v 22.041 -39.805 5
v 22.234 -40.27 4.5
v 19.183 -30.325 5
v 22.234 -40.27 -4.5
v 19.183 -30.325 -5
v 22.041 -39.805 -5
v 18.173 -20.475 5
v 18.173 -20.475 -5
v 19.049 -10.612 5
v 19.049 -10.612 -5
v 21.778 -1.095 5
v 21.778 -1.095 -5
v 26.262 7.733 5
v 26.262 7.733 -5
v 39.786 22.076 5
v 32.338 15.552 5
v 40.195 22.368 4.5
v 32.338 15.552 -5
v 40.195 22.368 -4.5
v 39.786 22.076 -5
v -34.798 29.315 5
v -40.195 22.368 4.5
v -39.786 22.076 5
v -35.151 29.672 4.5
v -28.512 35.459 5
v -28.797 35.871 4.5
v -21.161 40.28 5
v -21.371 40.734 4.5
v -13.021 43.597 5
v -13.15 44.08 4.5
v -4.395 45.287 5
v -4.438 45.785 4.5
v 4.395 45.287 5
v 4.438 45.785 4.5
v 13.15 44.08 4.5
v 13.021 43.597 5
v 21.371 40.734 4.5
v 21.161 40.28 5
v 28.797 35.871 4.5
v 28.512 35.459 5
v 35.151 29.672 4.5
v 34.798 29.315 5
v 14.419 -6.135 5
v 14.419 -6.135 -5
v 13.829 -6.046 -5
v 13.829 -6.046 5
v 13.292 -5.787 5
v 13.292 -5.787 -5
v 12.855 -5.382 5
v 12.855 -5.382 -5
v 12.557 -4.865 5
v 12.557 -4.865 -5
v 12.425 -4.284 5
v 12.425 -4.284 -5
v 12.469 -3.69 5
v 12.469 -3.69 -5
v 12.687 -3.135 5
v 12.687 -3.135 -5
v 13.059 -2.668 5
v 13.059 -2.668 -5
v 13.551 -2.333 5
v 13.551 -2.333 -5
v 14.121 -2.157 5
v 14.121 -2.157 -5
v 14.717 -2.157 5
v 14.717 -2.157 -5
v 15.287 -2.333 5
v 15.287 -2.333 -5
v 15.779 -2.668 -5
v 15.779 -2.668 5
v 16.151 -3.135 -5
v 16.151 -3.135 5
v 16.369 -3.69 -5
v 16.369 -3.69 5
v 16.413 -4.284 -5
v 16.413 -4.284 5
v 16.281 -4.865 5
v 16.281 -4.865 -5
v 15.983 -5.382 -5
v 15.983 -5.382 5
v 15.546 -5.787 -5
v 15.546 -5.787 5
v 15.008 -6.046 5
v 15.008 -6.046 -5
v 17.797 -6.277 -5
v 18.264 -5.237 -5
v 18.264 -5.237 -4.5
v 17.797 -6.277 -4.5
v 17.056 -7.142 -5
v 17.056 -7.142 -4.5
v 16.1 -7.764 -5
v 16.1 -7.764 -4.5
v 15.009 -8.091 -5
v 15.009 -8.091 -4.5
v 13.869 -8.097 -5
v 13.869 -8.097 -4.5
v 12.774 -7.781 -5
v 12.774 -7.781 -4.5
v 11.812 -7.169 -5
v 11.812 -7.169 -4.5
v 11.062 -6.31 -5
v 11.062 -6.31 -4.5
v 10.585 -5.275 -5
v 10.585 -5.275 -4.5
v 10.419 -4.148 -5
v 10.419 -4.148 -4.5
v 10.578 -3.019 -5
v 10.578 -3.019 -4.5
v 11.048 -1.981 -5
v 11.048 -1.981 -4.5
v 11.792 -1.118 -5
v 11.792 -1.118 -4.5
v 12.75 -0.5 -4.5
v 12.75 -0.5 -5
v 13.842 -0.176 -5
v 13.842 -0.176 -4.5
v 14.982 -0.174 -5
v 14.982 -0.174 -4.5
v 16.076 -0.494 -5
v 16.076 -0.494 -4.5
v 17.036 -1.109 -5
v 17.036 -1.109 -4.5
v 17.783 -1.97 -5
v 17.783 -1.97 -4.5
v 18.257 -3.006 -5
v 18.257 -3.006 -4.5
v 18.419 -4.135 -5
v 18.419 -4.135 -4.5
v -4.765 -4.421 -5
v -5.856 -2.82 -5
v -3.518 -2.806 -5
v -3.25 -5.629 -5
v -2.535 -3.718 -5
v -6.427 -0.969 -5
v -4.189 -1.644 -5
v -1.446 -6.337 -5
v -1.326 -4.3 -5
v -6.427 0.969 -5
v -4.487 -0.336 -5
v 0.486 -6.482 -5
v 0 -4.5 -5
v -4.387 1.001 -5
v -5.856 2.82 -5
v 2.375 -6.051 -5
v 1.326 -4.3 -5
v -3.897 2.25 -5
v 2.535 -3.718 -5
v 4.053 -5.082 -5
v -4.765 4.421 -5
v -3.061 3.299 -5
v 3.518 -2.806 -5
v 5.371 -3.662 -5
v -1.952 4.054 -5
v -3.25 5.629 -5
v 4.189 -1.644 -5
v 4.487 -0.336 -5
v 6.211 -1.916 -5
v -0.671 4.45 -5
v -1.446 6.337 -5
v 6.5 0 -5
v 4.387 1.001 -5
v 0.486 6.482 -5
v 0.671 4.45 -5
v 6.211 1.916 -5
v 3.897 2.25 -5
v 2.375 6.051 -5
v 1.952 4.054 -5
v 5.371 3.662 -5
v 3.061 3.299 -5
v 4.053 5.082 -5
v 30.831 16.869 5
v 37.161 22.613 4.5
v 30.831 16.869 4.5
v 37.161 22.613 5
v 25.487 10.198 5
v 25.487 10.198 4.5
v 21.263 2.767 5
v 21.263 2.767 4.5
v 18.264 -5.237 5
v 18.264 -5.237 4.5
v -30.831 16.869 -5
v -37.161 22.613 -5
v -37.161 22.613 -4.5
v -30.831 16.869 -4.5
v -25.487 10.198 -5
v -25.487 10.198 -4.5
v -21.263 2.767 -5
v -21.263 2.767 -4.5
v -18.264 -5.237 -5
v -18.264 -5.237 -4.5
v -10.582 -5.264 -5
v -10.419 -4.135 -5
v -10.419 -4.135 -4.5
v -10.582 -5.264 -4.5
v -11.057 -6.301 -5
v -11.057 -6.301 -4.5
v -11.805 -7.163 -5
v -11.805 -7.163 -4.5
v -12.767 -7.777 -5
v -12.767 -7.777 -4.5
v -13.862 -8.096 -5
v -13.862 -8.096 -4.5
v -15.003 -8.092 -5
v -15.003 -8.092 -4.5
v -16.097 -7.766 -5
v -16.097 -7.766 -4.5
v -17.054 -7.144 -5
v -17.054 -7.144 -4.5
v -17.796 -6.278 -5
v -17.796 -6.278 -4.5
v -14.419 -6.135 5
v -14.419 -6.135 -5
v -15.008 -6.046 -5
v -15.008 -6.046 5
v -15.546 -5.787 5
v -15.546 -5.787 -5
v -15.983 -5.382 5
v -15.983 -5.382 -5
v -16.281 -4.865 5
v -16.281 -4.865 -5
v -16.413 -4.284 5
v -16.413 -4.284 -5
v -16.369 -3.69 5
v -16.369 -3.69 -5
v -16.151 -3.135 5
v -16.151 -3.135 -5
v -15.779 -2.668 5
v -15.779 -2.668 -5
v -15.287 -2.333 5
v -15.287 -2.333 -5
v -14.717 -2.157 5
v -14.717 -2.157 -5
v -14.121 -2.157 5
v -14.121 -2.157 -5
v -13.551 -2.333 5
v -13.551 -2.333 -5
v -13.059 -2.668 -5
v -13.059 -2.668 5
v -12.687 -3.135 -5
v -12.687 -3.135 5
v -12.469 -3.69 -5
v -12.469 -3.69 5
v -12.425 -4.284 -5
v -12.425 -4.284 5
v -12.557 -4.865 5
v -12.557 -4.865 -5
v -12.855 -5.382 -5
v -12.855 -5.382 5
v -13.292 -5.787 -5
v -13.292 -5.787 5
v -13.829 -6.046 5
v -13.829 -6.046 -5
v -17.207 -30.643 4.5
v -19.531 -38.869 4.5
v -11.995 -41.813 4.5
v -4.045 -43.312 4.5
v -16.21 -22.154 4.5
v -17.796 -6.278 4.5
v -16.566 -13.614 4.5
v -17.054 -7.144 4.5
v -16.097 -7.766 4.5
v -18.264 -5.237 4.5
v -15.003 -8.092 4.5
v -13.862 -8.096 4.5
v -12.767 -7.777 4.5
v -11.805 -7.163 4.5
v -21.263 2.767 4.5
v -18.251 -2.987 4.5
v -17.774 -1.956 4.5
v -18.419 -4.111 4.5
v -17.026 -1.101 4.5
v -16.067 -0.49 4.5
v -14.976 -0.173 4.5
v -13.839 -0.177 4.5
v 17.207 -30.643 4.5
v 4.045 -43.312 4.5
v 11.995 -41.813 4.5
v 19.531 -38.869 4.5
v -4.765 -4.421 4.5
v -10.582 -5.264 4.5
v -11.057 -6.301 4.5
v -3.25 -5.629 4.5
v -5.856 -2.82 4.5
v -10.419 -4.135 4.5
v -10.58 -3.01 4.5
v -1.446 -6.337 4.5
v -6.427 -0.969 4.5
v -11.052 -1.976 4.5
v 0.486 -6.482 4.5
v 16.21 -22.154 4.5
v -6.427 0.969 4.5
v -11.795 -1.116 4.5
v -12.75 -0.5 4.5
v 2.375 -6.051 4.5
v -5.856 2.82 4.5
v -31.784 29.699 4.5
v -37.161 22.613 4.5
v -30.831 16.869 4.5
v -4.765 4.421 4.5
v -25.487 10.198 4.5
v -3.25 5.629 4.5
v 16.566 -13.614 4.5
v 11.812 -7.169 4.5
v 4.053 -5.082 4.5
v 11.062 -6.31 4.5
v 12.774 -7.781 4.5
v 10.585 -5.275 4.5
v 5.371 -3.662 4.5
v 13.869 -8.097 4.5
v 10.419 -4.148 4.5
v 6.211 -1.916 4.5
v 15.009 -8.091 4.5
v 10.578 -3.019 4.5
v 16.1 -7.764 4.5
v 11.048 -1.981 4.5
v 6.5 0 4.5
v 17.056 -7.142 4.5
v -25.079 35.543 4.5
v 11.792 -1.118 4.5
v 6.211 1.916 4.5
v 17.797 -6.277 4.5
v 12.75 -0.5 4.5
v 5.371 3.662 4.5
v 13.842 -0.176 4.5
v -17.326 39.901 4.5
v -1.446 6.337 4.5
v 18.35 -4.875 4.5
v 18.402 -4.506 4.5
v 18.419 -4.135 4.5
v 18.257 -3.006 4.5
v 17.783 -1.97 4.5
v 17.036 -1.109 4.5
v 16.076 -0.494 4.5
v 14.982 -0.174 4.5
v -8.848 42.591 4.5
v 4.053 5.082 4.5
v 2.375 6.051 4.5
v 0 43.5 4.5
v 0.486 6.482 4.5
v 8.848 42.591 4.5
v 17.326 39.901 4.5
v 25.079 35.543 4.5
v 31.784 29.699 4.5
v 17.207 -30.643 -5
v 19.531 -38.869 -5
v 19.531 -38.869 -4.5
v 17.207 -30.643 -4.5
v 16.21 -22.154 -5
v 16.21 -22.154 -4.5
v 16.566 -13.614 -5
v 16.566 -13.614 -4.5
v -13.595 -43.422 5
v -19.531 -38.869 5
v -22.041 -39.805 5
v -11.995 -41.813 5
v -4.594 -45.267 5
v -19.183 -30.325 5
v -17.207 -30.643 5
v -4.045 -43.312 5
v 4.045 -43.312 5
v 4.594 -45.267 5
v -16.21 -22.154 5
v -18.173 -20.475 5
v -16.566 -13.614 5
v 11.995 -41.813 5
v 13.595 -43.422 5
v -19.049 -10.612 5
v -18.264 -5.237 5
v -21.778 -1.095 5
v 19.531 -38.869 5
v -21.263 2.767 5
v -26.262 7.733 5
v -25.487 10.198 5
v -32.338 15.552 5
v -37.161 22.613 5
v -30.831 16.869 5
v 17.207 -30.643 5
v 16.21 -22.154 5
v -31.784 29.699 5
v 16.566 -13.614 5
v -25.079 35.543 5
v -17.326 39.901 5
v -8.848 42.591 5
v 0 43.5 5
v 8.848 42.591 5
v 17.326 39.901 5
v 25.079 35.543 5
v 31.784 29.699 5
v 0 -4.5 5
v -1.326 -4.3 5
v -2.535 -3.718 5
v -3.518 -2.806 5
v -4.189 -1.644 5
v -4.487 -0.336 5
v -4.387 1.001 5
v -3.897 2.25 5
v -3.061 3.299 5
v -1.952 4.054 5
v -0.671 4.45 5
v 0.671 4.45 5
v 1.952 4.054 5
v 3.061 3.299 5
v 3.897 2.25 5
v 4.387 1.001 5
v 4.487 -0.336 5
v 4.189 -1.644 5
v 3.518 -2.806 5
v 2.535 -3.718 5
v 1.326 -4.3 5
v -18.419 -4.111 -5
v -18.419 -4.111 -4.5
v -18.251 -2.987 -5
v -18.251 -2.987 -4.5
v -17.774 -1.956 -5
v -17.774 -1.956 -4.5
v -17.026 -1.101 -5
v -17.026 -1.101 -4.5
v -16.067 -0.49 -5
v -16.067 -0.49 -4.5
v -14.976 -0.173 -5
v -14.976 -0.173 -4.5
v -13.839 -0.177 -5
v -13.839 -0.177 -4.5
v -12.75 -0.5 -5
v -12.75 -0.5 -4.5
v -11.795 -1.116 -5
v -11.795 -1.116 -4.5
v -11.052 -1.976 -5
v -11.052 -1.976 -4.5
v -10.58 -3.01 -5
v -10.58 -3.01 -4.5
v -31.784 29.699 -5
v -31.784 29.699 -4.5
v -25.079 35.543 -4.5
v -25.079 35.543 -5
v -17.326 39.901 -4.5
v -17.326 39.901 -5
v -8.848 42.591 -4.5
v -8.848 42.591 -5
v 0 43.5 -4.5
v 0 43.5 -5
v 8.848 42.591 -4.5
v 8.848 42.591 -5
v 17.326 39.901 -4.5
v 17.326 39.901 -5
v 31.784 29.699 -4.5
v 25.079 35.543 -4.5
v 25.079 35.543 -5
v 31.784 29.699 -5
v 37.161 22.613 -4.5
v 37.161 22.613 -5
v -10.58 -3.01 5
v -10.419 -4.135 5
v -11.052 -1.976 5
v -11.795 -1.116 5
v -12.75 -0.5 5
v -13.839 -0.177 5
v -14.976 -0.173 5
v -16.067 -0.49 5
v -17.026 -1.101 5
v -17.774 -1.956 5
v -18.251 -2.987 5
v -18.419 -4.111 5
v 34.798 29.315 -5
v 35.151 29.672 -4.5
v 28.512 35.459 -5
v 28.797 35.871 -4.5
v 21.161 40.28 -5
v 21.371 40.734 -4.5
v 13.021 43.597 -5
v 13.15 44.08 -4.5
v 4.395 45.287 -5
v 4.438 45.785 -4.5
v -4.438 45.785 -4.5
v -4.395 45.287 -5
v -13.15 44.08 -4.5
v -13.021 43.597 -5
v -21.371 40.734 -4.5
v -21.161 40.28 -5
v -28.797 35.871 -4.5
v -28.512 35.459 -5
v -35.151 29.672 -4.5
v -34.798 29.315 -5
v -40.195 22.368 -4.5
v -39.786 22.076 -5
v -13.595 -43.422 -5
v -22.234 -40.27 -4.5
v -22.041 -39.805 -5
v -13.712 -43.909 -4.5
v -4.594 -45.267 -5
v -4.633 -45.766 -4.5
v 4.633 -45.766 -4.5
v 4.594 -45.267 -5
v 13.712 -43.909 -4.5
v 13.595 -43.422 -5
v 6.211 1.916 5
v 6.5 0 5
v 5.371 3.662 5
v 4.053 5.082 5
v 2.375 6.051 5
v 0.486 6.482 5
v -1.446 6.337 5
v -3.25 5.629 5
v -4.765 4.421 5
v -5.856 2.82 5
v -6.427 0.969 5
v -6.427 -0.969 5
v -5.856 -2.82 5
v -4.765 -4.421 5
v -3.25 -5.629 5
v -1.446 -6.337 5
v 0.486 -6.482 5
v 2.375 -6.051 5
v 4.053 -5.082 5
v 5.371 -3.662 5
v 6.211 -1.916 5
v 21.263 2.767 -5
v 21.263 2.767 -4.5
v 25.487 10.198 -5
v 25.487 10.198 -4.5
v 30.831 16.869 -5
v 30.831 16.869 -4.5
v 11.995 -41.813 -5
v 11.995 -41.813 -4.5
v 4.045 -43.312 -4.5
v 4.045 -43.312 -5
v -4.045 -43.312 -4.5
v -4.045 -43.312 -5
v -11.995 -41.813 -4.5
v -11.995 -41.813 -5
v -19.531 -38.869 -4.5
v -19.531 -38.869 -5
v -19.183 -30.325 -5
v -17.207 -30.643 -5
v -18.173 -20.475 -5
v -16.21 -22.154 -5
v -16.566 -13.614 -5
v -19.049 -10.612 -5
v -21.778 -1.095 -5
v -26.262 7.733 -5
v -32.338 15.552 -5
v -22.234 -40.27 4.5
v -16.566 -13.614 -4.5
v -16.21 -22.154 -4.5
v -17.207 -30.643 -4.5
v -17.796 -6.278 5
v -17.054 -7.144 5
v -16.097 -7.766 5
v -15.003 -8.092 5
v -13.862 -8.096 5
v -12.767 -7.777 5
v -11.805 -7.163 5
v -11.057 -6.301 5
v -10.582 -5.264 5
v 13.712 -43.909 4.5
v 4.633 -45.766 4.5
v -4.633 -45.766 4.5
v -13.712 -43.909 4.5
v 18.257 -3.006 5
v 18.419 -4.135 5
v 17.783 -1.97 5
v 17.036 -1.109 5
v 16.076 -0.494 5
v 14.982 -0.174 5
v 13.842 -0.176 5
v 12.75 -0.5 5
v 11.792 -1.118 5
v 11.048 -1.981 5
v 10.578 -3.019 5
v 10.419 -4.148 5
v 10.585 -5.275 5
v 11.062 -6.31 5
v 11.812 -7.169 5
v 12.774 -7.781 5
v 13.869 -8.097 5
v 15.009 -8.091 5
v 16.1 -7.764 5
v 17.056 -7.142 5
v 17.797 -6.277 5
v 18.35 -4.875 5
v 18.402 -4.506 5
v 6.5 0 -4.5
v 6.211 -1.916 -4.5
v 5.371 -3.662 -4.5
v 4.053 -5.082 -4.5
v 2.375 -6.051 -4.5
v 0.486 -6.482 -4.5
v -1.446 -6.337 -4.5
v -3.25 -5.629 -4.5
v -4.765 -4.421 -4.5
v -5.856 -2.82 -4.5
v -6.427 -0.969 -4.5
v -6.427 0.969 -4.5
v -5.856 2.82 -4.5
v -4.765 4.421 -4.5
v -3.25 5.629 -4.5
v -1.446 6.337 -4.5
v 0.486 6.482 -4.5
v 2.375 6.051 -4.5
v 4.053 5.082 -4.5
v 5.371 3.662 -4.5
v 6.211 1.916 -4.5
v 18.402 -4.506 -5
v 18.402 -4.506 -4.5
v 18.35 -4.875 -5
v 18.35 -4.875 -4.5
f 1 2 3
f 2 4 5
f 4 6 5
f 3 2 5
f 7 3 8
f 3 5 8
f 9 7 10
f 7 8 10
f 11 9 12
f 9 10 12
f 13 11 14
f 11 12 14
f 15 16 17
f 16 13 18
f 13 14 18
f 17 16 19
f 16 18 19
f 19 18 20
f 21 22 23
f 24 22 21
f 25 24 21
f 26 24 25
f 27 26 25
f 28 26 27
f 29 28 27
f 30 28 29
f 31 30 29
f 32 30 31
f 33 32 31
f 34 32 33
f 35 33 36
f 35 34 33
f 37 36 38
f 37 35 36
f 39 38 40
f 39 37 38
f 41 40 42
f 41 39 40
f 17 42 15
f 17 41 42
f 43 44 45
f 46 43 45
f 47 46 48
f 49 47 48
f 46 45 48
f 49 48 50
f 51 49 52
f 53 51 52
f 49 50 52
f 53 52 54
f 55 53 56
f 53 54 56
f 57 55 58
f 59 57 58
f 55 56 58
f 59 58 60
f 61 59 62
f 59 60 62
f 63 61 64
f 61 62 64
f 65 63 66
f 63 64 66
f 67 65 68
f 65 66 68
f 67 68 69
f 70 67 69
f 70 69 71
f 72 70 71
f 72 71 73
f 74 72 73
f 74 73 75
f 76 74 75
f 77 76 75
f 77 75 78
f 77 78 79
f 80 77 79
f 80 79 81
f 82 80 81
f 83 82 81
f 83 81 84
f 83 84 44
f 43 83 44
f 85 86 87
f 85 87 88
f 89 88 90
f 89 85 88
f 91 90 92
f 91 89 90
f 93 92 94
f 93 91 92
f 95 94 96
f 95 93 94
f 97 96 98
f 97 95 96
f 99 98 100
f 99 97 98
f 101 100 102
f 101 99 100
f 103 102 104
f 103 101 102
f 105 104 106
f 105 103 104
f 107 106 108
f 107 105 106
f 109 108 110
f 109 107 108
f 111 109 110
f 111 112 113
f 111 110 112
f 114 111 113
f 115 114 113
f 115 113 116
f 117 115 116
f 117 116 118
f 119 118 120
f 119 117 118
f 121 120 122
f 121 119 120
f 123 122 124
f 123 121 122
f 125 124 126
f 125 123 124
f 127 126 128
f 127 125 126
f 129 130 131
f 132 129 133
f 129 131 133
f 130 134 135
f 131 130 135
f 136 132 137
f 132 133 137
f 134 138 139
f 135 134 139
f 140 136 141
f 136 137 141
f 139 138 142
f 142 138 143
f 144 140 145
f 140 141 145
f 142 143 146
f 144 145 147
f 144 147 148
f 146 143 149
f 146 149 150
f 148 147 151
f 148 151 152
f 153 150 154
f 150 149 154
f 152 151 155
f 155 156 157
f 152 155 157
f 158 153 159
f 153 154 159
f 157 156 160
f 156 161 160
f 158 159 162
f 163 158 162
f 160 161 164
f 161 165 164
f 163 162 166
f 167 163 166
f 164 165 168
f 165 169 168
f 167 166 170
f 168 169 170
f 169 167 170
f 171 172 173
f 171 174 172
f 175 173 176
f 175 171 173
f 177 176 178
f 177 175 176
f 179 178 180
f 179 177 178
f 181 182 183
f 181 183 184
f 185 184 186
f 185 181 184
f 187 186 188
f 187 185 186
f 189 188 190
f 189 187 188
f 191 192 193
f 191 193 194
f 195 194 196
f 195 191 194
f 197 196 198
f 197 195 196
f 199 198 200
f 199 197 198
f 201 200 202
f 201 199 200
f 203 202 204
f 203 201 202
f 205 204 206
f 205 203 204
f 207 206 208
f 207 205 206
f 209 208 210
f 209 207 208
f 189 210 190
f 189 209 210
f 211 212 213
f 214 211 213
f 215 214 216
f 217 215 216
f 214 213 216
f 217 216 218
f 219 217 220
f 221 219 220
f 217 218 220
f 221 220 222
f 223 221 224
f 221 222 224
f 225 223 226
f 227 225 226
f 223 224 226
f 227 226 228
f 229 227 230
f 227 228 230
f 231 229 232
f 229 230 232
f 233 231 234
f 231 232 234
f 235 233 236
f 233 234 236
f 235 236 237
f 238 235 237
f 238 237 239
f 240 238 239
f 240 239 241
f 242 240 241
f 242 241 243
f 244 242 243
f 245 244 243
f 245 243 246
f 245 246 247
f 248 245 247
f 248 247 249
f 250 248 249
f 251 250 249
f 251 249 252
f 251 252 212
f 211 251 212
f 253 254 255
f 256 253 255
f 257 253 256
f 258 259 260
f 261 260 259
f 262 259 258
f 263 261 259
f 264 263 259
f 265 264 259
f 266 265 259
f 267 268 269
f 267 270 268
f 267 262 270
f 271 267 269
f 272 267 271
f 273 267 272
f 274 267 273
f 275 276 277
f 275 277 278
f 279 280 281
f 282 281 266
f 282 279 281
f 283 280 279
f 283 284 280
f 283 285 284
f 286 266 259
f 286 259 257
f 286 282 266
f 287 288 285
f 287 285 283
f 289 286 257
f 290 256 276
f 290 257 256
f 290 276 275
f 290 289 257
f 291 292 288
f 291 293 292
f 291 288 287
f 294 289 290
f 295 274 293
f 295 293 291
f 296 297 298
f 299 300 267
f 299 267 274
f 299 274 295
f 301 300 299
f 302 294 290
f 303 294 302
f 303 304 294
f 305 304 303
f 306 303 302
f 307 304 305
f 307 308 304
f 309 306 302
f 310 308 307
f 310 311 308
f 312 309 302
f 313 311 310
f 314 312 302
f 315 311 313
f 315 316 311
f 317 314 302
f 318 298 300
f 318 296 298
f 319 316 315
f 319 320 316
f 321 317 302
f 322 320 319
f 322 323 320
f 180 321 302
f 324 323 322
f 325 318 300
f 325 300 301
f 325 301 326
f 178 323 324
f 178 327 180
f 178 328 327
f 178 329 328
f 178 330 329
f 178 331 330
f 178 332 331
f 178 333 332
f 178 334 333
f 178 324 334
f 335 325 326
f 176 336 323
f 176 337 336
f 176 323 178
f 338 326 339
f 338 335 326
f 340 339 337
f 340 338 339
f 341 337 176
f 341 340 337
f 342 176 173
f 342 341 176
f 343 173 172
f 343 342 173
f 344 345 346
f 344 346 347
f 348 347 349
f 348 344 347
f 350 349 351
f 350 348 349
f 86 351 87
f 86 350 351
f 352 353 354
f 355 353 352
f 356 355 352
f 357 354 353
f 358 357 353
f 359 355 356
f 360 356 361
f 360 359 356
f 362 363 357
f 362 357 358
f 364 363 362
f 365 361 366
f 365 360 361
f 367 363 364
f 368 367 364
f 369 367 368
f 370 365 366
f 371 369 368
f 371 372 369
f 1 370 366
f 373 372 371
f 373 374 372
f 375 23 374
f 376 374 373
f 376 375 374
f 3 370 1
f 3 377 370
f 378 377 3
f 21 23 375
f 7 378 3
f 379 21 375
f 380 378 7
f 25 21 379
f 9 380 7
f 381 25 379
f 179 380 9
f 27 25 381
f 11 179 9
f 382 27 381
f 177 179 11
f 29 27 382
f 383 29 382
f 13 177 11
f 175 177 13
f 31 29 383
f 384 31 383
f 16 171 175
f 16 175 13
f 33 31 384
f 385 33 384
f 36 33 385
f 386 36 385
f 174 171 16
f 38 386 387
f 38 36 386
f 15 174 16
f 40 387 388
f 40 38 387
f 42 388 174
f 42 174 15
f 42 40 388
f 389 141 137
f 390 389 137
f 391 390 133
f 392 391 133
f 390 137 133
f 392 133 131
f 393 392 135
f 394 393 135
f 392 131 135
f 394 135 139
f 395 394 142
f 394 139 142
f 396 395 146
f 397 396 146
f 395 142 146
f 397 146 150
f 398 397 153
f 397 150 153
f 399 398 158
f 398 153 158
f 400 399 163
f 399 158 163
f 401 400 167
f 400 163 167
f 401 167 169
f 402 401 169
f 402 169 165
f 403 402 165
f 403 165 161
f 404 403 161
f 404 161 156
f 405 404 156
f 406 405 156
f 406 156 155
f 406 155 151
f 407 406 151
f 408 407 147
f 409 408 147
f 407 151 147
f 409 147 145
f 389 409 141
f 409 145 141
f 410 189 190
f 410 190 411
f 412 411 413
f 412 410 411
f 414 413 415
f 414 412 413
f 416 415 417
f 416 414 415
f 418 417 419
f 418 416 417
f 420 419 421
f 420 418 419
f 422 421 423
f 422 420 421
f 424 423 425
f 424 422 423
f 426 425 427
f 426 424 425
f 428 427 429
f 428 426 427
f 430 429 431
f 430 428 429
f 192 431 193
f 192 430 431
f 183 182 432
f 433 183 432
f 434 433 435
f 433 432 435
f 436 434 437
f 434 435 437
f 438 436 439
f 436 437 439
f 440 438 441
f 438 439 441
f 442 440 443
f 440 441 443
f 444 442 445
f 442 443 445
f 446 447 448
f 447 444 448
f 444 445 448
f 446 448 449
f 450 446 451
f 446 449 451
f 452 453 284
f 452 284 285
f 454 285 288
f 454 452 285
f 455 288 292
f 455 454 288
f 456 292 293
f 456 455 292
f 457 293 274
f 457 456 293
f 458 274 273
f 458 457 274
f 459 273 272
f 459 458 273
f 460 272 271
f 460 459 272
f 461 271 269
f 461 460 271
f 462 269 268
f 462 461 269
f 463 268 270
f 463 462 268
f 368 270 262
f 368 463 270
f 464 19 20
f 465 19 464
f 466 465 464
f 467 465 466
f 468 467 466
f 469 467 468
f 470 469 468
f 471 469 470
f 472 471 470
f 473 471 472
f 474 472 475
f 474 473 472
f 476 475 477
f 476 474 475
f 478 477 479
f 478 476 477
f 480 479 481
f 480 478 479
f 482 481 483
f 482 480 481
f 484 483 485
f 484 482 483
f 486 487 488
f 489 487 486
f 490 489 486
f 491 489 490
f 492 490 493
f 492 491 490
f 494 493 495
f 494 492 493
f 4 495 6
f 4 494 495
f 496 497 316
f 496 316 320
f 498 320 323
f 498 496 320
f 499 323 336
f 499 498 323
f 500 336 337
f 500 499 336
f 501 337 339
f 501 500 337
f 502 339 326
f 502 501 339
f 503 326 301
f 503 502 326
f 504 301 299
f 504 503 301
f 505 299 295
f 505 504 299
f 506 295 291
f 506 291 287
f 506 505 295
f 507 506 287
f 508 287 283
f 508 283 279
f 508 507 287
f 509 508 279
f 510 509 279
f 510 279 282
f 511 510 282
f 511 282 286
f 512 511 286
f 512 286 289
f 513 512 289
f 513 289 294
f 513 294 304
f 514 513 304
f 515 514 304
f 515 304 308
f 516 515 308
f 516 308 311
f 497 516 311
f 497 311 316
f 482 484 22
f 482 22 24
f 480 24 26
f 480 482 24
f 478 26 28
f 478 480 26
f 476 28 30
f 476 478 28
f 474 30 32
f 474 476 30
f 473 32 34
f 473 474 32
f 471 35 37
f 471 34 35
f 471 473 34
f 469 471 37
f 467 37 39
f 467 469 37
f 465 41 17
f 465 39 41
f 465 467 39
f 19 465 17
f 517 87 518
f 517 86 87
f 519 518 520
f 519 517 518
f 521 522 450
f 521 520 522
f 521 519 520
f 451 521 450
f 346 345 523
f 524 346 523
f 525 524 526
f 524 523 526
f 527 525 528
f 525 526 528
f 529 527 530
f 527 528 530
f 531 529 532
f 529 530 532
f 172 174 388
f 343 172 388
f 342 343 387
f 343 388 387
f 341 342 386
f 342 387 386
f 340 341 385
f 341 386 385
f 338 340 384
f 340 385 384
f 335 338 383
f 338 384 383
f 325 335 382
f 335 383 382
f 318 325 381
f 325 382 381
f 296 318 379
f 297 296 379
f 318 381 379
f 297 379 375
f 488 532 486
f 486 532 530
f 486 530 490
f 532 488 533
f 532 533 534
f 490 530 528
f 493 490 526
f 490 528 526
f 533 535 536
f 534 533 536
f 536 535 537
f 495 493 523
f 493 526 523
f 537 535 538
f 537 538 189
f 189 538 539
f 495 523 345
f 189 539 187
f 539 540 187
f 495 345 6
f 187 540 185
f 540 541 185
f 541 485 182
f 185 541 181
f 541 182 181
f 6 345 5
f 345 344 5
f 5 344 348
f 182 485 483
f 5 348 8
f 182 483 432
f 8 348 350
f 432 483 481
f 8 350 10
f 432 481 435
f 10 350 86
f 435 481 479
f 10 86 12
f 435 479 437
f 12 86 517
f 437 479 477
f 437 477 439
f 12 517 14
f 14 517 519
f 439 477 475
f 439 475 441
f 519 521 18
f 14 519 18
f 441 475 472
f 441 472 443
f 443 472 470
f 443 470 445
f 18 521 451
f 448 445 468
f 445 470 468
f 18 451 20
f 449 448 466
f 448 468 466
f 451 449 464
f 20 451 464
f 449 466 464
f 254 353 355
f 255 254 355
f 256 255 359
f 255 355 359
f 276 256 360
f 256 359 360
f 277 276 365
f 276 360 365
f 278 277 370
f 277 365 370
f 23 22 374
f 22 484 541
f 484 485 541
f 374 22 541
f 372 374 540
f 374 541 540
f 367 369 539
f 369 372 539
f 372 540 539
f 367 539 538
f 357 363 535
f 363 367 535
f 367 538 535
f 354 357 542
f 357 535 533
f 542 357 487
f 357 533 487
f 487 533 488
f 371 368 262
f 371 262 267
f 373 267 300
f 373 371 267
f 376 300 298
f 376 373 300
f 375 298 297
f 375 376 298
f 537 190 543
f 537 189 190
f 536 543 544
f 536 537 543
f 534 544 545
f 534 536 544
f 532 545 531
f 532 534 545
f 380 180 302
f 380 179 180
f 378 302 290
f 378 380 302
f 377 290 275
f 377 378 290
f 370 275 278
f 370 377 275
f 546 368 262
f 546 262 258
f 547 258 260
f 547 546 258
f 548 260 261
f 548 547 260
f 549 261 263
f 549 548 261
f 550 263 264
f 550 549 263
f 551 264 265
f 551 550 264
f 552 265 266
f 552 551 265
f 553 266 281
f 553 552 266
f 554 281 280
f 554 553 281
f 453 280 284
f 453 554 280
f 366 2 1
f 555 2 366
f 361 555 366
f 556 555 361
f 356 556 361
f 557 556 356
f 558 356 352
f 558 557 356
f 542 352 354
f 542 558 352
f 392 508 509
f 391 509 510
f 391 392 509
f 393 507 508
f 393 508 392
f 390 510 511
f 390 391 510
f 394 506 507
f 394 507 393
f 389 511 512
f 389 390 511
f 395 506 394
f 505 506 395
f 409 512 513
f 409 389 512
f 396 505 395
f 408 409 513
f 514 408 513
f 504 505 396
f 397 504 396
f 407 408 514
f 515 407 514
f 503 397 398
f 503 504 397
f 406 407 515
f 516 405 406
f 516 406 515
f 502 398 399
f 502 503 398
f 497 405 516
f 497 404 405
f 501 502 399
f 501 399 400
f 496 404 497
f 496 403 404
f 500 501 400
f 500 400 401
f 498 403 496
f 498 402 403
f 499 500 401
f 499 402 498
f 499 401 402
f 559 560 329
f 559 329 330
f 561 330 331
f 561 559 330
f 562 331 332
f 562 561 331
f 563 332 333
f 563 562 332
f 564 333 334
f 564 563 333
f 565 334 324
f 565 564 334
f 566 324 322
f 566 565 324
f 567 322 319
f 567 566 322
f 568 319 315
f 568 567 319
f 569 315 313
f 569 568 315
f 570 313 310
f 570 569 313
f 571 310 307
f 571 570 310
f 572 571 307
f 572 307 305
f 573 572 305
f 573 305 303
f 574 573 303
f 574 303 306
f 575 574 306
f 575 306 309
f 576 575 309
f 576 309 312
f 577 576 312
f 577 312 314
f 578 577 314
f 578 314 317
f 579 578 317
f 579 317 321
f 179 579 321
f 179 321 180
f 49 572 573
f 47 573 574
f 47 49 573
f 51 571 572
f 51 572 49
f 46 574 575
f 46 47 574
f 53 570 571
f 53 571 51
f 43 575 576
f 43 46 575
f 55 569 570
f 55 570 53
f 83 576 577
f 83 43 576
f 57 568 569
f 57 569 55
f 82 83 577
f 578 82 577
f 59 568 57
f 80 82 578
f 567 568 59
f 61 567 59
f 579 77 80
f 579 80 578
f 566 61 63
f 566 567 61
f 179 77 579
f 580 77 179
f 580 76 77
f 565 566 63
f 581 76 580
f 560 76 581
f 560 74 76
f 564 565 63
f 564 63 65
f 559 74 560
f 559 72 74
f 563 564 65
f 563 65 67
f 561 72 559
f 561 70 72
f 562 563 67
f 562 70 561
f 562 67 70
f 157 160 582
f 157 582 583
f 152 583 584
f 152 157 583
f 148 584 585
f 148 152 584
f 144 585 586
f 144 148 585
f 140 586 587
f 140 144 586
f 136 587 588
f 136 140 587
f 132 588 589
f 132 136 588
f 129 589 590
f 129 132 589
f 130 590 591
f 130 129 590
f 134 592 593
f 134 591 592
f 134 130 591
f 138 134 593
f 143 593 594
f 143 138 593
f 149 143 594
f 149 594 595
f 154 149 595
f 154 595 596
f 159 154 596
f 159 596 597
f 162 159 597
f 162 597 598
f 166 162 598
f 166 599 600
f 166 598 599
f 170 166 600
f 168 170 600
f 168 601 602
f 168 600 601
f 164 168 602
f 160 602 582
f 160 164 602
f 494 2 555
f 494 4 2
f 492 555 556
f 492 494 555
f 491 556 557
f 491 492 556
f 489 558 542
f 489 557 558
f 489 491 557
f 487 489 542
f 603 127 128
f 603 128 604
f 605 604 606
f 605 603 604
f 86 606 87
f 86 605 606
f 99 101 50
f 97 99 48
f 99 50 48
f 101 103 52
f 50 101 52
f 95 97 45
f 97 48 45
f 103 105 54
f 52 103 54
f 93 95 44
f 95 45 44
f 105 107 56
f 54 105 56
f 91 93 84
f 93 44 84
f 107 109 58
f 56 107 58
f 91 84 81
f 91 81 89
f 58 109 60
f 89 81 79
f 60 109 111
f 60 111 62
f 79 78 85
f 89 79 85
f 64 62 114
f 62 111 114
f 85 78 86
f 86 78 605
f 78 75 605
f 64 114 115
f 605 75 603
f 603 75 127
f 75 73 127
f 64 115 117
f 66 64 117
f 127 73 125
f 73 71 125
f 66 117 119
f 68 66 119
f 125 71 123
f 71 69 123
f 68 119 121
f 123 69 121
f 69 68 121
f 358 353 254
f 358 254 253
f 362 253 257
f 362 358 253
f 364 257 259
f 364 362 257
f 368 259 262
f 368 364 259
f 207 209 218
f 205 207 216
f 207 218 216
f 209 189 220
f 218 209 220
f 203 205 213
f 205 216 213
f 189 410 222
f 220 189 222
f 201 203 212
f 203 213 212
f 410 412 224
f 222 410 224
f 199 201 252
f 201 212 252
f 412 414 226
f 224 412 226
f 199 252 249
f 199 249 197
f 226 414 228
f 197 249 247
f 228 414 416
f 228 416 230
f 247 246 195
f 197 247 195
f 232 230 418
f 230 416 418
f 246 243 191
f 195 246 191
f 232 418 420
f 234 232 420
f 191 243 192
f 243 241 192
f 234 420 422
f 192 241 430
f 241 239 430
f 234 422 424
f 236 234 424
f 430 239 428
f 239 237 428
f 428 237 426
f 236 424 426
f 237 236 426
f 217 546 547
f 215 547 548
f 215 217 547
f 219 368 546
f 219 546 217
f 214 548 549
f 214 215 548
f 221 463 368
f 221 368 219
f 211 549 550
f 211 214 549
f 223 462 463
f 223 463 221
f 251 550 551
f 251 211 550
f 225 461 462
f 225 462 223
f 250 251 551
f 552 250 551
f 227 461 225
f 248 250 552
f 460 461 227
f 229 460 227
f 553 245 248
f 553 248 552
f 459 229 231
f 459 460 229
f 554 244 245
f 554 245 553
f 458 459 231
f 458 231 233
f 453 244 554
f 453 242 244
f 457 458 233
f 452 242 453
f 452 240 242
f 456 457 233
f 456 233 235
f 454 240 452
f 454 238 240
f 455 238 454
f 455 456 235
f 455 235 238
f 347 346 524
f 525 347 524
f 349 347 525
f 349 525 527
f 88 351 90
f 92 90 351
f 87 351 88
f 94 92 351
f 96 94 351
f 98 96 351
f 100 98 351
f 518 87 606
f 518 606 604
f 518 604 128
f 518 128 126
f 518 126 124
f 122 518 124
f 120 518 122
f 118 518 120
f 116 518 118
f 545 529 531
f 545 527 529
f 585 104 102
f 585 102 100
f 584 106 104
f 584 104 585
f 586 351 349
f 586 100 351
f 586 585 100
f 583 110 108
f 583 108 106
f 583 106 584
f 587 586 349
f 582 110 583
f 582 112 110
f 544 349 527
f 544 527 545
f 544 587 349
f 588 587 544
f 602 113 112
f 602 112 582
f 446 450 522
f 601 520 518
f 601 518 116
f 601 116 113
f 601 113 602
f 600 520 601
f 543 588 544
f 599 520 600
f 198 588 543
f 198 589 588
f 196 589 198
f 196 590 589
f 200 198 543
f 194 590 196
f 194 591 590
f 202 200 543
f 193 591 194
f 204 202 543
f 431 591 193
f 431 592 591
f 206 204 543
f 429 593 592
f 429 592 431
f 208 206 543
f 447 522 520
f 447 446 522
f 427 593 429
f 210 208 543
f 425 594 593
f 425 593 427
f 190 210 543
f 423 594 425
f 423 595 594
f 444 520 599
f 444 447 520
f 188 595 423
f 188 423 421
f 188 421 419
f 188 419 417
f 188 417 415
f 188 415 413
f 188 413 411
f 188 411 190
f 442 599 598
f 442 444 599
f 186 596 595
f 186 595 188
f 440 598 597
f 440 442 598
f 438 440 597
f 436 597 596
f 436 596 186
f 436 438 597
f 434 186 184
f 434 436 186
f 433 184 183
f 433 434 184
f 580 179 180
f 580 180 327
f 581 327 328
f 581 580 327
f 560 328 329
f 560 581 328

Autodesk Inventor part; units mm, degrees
ref_plane "YZ Plane" through (0, 0, 0) normal (1, 0, 0) x (0, 1, 0)
ref_plane "XZ Plane" through (0, 0, 0) normal (0, 1, 0) x (-1, 0, 0)
ref_plane "XY Plane" through (0, 0, 0) normal (0, 0, 1) x (1, 0, 0)
sketch "Sketch1" plane through (0, 0, 0) normal (0, 0, 1) x (1, 0, 0)
  arc A0 (-44.218038, -12.679318) -> (-22.234092, -40.269655) centre (0, 0) ccw construction
  arc A1 (-22.234092, -40.269655) -> (-40.195246, 22.368331) centre (-70.172104, -20.121527) ccw
  line L0 (0, 0) -> (-70.172104, -20.121527) construction
  line L1 (0, -64.4) -> (0, 64.4) construction
  arc A2 (40.195246, 22.368331) -> (22.234092, -40.269655) centre (70.172104, -20.121527) ccw
  line L2 (0, 0) -> (70.172104, -20.121527) construction
  arc A3 (-40.195246, 22.368331) -> (-44.218038, 12.679318) centre (0, 0) ccw construction
  arc A4 (-22.234092, -40.269655) -> (22.234092, -40.269655) centre (0, 0) ccw
  arc A5 (22.234092, -40.269655) -> (40.195246, 22.368331) centre (0, 0) ccw construction
  arc A6 (40.195246, 22.368331) -> (-40.195246, 22.368331) centre (0, 0) ccw
  arc A7 (-44.218038, 12.679318) -> (-44.218038, -12.679318) centre (0, 0) ccw construction
  dimension "d0" = 92
  dimension "d1" = 52
  dimension "d2" = 73
  dimension "d3" = 148
extrude "Extrusion1" add sketch "Sketch1" along normal mid plane 10
sketch "Sketch2" plane through (0, 0, 5) normal (0, 0, 1) x (1, 0, 0)
  arc A0 (-22.234092, -40.269655) -> (-40.195246, 22.368331) centre (-70.172104, -20.121527) ccw
  arc A1 (-22.234092, -40.269655) -> (22.234092, -40.269655) centre (0, 0) ccw
  arc A2 (40.195246, 22.368331) -> (22.234092, -40.269655) centre (70.172104, -20.121527) ccw
  arc A3 (40.195246, 22.368331) -> (-40.195246, 22.368331) centre (0, 0) ccw
  line L0 (0, 0) -> (-70.172104, -20.121527) construction
  line L1 (0, 0) -> (70.172104, -20.121527) construction
  point P0 (-14.418925, -4.13456)
  point P1 (14.418925, -4.13456)
  dimension "d6" = 15
  dimension "d7" = 15
hole "Hole1" at (-14.418925, -4.13456, 5) at (14.418925, -4.13456, 5) direction (0, 0, -1) diameter 4 end through all
sketch "Sketch3" plane through (0, 0, 5) normal (0, 0, 1) x (1, 0, 0)
  arc A0 (-22.234092, -40.269655) -> (22.234092, -40.269655) centre (0, 0) ccw
hole "Hole2" at (0, 0, 5) direction (0, 0, -1) diameter 9 end through all
chamfer "Chamfer1" distance 0.5 angle 45 4 edges at (0, 46, 5) (0, 46, -5) (0, -46, -5) (0, -46, 5)
sketch "Sketch4" plane through (0, 0, 5) normal (0, 0, 1) x (1, 0, 0)
  arc A0 (-22.041384, -39.804866) -> (22.041384, -39.804866) centre (0, 0) ccw
  arc A1 (39.785519, 22.076287) -> (22.041384, -39.804866) centre (70.172104, -20.121527) ccw
  arc A2 (39.785519, 22.076287) -> (-39.785519, 22.076287) centre (0, 0) ccw
  arc A3 (-22.041384, -39.804866) -> (-39.785519, 22.076287) centre (-70.172104, -20.121527) ccw
  circle A4 centre (0, 0) radius 4.5
  circle A5 centre (-14.418925, -4.13456) radius 2
  circle A6 centre (14.418925, -4.13456) radius 2
  arc A7 (37.160523, 22.61295) -> (-37.160523, 22.61295) centre (0, 0) ccw
  arc A8 (37.160523, 22.61295) -> (19.530873, -38.868946) centre (70.172104, -20.121527) ccw
  arc A9 (-19.530873, -38.868946) -> (19.530873, -38.868946) centre (0, 0) ccw
  arc A10 (-19.530873, -38.868946) -> (-37.160523, 22.61295) centre (-70.172104, -20.121527) ccw
  circle A11 centre (-14.418925, -4.13456) radius 4
  circle A12 centre (0, 0) radius 6.5
  circle A13 centre (14.418925, -4.13456) radius 4
  dimension "d25" = 2
  dimension "d26" = 2
  dimension "d27" = 2
  dimension "d28" = 2
extrude "Extrusion2" cut sketch "Sketch4" against normal blind 0.5 contours A8 A9 A10 A7
mirror "Mirror1" about plane through (0, 0, 0) normal (0, 0, 1) of "Extrusion2"
equation "\"d7\" = d6"
properties part number "Disk" material "Steel"
